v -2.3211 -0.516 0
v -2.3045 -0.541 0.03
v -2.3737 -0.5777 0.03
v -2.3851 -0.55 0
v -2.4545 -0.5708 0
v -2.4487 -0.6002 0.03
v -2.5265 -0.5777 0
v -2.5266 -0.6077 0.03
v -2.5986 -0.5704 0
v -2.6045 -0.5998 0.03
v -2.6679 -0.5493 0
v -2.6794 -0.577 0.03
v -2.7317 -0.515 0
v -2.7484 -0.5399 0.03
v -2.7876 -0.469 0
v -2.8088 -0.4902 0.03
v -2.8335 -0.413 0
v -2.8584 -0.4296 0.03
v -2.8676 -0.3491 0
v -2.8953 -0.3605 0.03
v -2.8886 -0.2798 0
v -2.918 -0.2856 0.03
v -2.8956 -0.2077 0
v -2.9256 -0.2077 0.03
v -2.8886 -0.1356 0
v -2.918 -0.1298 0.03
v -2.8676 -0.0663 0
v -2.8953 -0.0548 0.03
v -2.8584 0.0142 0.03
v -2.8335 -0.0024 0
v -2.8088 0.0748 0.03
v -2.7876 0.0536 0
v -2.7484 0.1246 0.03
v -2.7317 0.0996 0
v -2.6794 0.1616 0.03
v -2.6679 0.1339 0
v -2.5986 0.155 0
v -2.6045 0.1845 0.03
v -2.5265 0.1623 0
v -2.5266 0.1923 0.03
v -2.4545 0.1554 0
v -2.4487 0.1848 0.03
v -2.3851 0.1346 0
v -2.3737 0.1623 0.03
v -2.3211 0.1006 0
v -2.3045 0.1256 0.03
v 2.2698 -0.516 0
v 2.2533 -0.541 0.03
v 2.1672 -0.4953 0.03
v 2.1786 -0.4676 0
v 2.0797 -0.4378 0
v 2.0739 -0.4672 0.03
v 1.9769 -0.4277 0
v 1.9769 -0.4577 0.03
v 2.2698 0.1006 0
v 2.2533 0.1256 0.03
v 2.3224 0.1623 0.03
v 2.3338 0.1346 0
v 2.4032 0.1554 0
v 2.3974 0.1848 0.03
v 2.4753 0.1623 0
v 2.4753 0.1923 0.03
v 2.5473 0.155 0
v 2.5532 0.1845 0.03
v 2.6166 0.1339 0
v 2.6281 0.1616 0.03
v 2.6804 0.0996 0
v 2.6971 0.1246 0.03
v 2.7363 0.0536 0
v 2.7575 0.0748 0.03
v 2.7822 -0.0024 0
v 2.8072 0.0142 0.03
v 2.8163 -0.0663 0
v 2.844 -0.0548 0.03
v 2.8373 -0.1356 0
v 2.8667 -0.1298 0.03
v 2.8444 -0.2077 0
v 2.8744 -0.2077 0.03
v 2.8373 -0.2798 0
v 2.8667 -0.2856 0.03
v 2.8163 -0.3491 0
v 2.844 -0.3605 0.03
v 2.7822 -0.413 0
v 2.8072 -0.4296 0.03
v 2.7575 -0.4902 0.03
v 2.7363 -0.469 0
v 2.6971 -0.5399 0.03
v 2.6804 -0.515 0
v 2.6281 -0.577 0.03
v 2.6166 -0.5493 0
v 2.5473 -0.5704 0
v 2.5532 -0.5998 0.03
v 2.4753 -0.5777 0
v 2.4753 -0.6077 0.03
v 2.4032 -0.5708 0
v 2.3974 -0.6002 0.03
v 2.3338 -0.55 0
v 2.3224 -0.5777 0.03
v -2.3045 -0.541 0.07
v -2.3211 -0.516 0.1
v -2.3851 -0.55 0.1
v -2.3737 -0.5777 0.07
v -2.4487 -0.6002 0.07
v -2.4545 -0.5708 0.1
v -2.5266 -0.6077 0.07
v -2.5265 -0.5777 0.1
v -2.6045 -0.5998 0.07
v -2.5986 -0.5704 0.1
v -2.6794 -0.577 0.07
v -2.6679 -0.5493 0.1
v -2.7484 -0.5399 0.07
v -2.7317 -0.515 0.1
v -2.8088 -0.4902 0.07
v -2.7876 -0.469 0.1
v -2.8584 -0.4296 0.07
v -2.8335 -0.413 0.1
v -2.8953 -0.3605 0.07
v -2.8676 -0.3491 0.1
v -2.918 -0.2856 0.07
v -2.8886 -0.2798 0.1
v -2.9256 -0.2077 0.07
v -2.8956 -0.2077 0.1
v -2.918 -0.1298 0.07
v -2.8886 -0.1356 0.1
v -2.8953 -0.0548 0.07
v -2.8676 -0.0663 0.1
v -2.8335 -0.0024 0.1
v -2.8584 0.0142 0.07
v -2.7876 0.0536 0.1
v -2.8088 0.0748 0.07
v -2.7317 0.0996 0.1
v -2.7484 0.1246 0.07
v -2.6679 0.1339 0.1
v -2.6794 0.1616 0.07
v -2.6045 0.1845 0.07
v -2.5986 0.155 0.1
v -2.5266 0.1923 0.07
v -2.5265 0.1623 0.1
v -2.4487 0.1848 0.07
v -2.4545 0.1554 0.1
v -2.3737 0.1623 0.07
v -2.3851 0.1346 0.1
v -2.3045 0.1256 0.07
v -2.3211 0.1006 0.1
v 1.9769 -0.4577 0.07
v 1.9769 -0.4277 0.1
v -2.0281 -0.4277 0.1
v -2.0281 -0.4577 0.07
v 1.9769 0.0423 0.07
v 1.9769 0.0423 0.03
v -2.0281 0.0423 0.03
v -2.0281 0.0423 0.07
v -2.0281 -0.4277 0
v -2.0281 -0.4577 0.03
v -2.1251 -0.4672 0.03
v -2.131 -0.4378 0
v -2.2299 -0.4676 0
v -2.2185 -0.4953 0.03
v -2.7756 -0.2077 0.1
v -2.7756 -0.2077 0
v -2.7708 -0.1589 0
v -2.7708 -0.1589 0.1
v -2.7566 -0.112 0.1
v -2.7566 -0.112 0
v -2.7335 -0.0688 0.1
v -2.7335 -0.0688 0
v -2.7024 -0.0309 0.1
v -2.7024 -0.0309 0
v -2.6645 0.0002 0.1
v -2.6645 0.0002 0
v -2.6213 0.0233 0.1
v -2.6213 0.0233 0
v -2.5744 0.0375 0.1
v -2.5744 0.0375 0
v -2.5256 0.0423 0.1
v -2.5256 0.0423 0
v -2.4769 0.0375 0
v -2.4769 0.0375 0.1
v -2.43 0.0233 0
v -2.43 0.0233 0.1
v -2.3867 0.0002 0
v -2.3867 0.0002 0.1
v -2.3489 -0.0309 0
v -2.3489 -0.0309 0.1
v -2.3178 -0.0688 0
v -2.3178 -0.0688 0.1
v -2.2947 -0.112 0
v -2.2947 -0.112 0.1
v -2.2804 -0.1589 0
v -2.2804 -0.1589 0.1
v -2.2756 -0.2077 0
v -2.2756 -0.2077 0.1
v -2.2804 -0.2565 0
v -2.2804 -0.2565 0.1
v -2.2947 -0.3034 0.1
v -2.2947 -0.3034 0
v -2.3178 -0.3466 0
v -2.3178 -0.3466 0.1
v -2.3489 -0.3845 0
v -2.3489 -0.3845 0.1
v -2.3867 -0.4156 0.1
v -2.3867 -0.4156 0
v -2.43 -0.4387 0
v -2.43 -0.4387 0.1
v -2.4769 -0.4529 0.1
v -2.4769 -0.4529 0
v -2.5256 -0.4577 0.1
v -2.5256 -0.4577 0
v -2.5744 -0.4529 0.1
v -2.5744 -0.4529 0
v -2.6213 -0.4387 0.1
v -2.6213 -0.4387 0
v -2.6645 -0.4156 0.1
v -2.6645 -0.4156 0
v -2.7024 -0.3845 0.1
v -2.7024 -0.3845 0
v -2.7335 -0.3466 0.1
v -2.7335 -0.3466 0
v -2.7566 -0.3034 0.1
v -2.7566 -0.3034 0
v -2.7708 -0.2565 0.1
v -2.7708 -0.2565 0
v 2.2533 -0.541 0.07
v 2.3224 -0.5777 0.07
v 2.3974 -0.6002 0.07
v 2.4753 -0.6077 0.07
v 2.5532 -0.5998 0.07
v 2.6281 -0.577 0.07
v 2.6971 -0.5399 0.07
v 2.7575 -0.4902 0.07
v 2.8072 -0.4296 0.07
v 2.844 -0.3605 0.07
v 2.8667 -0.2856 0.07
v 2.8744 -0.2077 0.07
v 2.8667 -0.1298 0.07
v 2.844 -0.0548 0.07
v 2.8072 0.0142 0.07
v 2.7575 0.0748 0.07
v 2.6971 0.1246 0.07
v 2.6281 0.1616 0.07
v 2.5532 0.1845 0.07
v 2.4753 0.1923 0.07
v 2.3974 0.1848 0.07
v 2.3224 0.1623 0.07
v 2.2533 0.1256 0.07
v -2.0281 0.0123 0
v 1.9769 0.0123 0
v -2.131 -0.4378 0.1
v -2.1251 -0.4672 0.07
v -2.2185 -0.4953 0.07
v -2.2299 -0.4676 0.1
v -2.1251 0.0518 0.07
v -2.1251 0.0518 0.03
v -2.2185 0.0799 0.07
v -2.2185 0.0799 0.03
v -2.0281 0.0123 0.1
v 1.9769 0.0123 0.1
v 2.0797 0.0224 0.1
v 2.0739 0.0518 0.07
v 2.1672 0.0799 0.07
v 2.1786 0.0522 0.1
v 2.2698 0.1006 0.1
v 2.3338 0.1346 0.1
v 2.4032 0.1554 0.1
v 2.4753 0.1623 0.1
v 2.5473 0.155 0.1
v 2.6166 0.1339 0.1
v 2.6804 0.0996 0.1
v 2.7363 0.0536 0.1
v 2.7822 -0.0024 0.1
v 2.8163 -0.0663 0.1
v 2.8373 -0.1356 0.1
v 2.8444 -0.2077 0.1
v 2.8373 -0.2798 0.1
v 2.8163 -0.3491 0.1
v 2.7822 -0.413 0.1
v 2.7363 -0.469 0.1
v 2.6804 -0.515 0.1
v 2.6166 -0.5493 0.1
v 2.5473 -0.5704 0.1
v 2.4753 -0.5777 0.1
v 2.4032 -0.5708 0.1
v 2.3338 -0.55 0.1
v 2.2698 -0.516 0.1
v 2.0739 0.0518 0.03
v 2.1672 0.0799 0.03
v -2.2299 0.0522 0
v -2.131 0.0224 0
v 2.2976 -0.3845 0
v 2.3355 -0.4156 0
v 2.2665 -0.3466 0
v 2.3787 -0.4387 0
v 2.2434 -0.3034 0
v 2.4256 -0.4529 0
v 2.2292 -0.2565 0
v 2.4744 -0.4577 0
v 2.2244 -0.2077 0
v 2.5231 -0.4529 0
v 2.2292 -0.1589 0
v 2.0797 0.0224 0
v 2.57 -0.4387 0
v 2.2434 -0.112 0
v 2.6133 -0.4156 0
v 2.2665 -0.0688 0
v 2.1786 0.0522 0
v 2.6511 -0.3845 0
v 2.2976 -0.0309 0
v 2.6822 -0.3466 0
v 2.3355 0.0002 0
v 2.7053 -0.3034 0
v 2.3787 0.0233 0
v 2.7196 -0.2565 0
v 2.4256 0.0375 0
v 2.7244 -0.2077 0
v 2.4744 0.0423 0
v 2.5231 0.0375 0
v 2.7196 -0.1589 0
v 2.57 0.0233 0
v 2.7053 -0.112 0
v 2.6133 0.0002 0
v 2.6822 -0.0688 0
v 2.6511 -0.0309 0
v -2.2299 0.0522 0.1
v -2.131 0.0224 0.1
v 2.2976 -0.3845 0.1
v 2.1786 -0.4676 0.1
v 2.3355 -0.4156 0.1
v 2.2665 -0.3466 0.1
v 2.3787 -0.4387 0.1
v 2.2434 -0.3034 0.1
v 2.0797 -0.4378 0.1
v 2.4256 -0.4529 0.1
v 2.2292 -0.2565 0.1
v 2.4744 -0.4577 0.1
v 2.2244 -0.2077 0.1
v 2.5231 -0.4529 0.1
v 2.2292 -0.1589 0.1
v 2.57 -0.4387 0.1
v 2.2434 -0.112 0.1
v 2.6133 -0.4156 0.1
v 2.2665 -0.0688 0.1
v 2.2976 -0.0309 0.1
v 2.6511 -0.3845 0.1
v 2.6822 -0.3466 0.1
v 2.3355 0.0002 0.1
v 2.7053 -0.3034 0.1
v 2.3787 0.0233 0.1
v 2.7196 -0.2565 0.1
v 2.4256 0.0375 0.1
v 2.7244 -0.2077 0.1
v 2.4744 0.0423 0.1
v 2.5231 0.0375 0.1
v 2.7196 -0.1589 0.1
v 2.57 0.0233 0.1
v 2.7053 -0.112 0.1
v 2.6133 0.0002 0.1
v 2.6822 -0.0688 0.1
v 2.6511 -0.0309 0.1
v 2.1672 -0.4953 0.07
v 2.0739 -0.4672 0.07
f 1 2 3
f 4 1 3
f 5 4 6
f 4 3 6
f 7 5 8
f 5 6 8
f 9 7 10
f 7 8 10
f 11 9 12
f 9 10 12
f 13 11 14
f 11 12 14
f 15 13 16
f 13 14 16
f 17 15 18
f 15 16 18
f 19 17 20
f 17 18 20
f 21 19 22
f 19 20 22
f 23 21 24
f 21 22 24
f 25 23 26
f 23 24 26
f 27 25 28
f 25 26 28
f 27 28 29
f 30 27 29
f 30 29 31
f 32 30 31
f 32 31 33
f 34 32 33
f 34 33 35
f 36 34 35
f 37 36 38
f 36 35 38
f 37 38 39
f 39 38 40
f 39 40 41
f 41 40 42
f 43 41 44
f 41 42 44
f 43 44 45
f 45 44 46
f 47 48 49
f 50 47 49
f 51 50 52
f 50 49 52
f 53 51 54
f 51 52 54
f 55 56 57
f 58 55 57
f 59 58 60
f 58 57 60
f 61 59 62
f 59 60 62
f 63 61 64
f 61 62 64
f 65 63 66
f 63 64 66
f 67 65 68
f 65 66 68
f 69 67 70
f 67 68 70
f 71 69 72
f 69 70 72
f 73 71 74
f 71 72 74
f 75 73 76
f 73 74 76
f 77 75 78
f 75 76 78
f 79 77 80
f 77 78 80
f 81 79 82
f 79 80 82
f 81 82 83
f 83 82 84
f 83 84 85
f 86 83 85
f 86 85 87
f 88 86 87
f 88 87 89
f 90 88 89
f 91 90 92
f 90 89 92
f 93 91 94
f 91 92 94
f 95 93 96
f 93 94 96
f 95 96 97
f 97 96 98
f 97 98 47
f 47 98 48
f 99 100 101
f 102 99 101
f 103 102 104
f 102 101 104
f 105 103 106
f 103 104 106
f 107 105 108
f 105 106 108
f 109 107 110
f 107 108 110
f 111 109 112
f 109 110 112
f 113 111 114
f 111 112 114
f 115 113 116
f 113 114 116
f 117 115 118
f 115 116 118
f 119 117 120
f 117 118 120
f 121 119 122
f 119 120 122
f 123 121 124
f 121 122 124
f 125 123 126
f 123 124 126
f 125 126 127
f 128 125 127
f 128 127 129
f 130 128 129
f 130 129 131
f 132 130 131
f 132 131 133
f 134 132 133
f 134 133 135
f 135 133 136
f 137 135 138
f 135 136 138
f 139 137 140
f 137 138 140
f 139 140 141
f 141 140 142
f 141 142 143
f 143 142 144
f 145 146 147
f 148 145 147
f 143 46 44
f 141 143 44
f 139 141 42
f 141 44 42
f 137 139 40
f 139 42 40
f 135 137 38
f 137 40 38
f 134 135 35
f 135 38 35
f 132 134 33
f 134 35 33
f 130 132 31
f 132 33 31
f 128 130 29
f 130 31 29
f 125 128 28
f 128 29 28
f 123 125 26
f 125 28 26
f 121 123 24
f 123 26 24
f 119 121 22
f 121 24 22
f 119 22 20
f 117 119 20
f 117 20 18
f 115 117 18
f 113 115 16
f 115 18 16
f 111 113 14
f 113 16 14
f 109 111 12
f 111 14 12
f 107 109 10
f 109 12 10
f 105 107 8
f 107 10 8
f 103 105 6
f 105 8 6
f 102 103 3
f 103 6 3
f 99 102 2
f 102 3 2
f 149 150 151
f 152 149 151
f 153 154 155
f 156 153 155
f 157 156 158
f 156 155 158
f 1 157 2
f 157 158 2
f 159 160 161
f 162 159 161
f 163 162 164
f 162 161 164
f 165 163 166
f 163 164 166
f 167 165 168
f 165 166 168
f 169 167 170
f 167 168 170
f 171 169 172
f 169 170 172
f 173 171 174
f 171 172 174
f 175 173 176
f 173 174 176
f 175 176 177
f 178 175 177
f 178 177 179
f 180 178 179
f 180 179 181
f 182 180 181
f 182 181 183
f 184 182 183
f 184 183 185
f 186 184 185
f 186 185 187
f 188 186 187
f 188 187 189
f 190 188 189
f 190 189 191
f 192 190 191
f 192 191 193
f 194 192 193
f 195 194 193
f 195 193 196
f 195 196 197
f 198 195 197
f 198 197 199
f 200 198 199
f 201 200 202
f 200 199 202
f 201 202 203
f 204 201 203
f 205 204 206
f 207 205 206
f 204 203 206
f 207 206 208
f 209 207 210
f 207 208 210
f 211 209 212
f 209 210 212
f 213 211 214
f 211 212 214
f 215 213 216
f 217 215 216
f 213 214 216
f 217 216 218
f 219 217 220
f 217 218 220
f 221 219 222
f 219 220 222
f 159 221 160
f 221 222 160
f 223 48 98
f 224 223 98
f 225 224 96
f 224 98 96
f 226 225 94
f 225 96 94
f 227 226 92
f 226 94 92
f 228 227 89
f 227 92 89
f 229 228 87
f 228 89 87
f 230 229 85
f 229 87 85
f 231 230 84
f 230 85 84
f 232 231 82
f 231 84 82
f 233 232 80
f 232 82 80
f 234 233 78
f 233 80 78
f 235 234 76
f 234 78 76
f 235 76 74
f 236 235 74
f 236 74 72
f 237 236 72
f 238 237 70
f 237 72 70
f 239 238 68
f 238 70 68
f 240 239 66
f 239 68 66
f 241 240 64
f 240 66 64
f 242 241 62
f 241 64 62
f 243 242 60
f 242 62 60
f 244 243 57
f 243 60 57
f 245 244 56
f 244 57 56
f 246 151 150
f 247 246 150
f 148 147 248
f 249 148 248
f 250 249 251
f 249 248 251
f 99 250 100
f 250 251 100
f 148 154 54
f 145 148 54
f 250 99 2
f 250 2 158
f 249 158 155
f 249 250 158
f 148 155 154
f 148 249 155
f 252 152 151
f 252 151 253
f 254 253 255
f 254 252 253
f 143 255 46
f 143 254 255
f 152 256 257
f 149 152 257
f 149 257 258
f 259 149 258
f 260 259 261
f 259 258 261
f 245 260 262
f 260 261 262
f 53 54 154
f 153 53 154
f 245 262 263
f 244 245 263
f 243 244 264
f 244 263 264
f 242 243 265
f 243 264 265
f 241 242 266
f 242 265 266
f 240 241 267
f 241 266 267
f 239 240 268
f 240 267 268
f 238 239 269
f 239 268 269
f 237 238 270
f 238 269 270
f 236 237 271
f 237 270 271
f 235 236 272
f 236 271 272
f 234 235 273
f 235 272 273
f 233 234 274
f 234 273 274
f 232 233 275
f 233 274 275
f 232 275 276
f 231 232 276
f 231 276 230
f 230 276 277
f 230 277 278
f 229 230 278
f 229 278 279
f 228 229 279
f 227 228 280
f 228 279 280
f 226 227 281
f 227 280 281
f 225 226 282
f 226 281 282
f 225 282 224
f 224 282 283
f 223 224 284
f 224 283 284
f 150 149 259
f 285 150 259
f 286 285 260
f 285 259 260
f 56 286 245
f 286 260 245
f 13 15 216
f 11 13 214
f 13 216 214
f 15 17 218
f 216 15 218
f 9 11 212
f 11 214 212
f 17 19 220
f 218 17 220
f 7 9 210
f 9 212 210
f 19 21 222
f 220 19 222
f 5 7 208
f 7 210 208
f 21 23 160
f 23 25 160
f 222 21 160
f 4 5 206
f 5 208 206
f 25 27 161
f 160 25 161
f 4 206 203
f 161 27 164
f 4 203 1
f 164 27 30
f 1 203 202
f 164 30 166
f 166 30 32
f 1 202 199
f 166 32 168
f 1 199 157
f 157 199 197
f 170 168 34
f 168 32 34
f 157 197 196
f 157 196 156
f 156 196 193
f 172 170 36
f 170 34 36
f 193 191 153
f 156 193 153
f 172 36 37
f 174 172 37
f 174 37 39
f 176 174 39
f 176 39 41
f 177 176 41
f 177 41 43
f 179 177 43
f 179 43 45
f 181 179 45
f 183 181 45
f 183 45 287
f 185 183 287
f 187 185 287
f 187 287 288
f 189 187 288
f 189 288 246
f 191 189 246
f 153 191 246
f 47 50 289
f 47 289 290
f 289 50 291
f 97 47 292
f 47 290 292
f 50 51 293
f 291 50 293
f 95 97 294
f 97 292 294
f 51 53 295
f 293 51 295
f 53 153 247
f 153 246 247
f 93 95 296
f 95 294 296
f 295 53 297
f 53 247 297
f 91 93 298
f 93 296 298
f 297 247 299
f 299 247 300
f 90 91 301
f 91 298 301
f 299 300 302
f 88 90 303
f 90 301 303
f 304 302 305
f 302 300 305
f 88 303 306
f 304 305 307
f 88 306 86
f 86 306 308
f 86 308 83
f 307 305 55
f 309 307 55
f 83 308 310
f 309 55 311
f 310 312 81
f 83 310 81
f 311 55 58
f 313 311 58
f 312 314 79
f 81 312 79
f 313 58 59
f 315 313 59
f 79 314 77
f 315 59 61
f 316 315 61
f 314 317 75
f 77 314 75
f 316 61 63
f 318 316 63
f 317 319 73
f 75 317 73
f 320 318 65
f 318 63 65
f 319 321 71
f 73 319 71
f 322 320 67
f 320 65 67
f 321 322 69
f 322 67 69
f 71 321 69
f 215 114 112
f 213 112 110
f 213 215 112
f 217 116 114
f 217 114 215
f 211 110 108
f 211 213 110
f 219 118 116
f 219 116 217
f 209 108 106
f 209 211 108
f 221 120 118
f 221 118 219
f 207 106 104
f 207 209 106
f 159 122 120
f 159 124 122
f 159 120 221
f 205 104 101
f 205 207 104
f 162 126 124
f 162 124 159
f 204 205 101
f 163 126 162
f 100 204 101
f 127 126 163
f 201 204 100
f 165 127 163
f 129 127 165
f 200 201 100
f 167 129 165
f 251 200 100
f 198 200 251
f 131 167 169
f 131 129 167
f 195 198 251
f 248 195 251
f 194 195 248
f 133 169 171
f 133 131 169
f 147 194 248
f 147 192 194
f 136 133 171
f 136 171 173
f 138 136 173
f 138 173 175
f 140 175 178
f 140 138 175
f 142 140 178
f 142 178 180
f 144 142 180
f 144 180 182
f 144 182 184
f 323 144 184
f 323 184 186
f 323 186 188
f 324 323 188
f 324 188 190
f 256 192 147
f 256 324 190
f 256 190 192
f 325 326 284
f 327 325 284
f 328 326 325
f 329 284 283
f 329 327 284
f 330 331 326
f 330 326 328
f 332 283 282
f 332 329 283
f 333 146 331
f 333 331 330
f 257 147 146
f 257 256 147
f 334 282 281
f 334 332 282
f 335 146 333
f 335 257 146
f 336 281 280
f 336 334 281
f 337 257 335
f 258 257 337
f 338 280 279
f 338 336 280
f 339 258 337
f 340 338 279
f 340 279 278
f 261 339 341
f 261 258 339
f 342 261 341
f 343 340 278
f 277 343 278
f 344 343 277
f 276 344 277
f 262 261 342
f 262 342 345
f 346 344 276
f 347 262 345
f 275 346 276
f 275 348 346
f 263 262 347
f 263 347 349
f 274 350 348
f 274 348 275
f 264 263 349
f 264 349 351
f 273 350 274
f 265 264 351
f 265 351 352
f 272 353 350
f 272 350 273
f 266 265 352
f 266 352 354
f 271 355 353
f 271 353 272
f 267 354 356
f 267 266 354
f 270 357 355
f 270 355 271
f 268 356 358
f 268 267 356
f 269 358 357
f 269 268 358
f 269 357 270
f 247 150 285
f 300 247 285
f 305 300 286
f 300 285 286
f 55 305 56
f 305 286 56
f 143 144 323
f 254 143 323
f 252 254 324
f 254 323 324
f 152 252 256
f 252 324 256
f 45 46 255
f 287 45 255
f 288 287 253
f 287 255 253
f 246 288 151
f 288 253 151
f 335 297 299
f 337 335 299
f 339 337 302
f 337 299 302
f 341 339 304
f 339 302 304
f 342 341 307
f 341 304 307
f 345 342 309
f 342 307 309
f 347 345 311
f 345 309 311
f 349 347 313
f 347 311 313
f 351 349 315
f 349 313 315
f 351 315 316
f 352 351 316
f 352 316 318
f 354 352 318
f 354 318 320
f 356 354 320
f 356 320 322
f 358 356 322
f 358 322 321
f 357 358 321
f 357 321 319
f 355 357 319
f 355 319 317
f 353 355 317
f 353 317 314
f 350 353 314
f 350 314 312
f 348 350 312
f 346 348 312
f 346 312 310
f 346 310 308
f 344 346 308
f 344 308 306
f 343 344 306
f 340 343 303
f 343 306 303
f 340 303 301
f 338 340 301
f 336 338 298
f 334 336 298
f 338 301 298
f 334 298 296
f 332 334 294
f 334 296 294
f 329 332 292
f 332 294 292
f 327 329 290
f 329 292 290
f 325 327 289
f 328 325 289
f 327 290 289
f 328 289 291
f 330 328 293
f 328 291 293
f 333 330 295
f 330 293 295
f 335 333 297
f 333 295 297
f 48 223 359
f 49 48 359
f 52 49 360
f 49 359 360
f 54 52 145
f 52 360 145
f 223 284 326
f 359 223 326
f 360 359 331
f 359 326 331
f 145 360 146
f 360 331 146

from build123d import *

# Parameters (mm, degrees)
BOSS_EXTRUDE1_DEPTH     = 0.1
FILLET1_R               = 0.5
FILLET2_R               = 0.5
CHAMFER2_SIZE           = 0.03
CHAMFER3_SIZE           = 0.03
SKETCH3_R               = 0.25
CUT_EXTRUDE1_DEPTH      = 1
CUT_EXTRUDE1_DEPTH_BACK = 1.1


with BuildPart() as part:
    # Sketch2 → Boss-Extrude1 (new body)
    with BuildSketch(Plane.XY):
        with BuildLine():
            Line((2.162109074, 0.042307692), (-2.213391126, 0.042307692))
            ThreePointArc((-2.213391126, 0.042307692), (-2.925641026, -0.207692308), (-2.213391126, -0.457692308))
            Line((-2.213391126, -0.457692308), (2.162109074, -0.457692308))
            ThreePointArc((2.162109074, -0.457692308), (2.874358974, -0.207692308), (2.162109074, 0.042307692))
        make_face()
    extrude(amount=BOSS_EXTRUDE1_DEPTH)

    # Fillet1
    fillet1_edges = [part.edges().sort_by_distance(p)[0] for p in [
        (2.162109074, 0.042307692, 0.05),
    ]]
    fillet(fillet1_edges, radius=FILLET1_R)

    # Fillet2
    fillet2_edges = [part.edges().sort_by_distance(p)[0] for p in [
        (2.162109074, -0.457692308, 0.05),
        (-2.213391126, -0.457692308, 0.05),
        (-2.213391126, 0.042307692, 0.05),
    ]]
    fillet(fillet2_edges, radius=FILLET2_R)

    # Chamfer2
    chamfer2_edges = [part.edges().sort_by_distance(p)[0] for p in [
        (2.121202823, 0.063594138, 0.1),
        (-2.925641026, -0.207692308, 0.1),
        (-0.025641026, 0.042307692, 0.1),
        (-0.025641026, -0.457692308, 0.1),
        (2.874358974, -0.207692308, 0.1),
        (-2.172484874, 0.063594138, 0.1),
        (-2.172484874, -0.478978754, 0.1),
        (2.121202823, -0.478978754, 0.1),
    ]]
    chamfer(chamfer2_edges, length=CHAMFER2_SIZE)

    # Chamfer3
    chamfer3_edges = [part.edges().sort_by_distance(p)[0] for p in [
        (2.121202823, 0.063594138, 0),
        (-2.925641026, -0.207692308, 0),
        (-0.025641026, 0.042307692, 0),
        (-0.025641026, -0.457692308, 0),
        (2.874358974, -0.207692308, 0),
        (-2.172484874, 0.063594138, 0),
        (-2.172484874, -0.478978754, 0),
        (2.121202823, -0.478978754, 0),
    ]]
    chamfer(chamfer3_edges, length=CHAMFER3_SIZE)

    # Sketch3 → Cut-Extrude1 (cut, two sides)
    with BuildSketch(Plane(origin=(0, 0, 0), x_dir=(-1, 0, 0), z_dir=(0, 0, -1))) as cut_extrude1_sk:
        with Locations((-2.474358974, -0.207692308)):
            Circle(SKETCH3_R)
        with Locations((2.525641026, -0.207692308)):
            Circle(SKETCH3_R)
    extrude(amount=CUT_EXTRUDE1_DEPTH, mode=Mode.SUBTRACT)
    extrude(cut_extrude1_sk.sketch, amount=-CUT_EXTRUDE1_DEPTH_BACK, mode=Mode.SUBTRACT)


solid = part.part
